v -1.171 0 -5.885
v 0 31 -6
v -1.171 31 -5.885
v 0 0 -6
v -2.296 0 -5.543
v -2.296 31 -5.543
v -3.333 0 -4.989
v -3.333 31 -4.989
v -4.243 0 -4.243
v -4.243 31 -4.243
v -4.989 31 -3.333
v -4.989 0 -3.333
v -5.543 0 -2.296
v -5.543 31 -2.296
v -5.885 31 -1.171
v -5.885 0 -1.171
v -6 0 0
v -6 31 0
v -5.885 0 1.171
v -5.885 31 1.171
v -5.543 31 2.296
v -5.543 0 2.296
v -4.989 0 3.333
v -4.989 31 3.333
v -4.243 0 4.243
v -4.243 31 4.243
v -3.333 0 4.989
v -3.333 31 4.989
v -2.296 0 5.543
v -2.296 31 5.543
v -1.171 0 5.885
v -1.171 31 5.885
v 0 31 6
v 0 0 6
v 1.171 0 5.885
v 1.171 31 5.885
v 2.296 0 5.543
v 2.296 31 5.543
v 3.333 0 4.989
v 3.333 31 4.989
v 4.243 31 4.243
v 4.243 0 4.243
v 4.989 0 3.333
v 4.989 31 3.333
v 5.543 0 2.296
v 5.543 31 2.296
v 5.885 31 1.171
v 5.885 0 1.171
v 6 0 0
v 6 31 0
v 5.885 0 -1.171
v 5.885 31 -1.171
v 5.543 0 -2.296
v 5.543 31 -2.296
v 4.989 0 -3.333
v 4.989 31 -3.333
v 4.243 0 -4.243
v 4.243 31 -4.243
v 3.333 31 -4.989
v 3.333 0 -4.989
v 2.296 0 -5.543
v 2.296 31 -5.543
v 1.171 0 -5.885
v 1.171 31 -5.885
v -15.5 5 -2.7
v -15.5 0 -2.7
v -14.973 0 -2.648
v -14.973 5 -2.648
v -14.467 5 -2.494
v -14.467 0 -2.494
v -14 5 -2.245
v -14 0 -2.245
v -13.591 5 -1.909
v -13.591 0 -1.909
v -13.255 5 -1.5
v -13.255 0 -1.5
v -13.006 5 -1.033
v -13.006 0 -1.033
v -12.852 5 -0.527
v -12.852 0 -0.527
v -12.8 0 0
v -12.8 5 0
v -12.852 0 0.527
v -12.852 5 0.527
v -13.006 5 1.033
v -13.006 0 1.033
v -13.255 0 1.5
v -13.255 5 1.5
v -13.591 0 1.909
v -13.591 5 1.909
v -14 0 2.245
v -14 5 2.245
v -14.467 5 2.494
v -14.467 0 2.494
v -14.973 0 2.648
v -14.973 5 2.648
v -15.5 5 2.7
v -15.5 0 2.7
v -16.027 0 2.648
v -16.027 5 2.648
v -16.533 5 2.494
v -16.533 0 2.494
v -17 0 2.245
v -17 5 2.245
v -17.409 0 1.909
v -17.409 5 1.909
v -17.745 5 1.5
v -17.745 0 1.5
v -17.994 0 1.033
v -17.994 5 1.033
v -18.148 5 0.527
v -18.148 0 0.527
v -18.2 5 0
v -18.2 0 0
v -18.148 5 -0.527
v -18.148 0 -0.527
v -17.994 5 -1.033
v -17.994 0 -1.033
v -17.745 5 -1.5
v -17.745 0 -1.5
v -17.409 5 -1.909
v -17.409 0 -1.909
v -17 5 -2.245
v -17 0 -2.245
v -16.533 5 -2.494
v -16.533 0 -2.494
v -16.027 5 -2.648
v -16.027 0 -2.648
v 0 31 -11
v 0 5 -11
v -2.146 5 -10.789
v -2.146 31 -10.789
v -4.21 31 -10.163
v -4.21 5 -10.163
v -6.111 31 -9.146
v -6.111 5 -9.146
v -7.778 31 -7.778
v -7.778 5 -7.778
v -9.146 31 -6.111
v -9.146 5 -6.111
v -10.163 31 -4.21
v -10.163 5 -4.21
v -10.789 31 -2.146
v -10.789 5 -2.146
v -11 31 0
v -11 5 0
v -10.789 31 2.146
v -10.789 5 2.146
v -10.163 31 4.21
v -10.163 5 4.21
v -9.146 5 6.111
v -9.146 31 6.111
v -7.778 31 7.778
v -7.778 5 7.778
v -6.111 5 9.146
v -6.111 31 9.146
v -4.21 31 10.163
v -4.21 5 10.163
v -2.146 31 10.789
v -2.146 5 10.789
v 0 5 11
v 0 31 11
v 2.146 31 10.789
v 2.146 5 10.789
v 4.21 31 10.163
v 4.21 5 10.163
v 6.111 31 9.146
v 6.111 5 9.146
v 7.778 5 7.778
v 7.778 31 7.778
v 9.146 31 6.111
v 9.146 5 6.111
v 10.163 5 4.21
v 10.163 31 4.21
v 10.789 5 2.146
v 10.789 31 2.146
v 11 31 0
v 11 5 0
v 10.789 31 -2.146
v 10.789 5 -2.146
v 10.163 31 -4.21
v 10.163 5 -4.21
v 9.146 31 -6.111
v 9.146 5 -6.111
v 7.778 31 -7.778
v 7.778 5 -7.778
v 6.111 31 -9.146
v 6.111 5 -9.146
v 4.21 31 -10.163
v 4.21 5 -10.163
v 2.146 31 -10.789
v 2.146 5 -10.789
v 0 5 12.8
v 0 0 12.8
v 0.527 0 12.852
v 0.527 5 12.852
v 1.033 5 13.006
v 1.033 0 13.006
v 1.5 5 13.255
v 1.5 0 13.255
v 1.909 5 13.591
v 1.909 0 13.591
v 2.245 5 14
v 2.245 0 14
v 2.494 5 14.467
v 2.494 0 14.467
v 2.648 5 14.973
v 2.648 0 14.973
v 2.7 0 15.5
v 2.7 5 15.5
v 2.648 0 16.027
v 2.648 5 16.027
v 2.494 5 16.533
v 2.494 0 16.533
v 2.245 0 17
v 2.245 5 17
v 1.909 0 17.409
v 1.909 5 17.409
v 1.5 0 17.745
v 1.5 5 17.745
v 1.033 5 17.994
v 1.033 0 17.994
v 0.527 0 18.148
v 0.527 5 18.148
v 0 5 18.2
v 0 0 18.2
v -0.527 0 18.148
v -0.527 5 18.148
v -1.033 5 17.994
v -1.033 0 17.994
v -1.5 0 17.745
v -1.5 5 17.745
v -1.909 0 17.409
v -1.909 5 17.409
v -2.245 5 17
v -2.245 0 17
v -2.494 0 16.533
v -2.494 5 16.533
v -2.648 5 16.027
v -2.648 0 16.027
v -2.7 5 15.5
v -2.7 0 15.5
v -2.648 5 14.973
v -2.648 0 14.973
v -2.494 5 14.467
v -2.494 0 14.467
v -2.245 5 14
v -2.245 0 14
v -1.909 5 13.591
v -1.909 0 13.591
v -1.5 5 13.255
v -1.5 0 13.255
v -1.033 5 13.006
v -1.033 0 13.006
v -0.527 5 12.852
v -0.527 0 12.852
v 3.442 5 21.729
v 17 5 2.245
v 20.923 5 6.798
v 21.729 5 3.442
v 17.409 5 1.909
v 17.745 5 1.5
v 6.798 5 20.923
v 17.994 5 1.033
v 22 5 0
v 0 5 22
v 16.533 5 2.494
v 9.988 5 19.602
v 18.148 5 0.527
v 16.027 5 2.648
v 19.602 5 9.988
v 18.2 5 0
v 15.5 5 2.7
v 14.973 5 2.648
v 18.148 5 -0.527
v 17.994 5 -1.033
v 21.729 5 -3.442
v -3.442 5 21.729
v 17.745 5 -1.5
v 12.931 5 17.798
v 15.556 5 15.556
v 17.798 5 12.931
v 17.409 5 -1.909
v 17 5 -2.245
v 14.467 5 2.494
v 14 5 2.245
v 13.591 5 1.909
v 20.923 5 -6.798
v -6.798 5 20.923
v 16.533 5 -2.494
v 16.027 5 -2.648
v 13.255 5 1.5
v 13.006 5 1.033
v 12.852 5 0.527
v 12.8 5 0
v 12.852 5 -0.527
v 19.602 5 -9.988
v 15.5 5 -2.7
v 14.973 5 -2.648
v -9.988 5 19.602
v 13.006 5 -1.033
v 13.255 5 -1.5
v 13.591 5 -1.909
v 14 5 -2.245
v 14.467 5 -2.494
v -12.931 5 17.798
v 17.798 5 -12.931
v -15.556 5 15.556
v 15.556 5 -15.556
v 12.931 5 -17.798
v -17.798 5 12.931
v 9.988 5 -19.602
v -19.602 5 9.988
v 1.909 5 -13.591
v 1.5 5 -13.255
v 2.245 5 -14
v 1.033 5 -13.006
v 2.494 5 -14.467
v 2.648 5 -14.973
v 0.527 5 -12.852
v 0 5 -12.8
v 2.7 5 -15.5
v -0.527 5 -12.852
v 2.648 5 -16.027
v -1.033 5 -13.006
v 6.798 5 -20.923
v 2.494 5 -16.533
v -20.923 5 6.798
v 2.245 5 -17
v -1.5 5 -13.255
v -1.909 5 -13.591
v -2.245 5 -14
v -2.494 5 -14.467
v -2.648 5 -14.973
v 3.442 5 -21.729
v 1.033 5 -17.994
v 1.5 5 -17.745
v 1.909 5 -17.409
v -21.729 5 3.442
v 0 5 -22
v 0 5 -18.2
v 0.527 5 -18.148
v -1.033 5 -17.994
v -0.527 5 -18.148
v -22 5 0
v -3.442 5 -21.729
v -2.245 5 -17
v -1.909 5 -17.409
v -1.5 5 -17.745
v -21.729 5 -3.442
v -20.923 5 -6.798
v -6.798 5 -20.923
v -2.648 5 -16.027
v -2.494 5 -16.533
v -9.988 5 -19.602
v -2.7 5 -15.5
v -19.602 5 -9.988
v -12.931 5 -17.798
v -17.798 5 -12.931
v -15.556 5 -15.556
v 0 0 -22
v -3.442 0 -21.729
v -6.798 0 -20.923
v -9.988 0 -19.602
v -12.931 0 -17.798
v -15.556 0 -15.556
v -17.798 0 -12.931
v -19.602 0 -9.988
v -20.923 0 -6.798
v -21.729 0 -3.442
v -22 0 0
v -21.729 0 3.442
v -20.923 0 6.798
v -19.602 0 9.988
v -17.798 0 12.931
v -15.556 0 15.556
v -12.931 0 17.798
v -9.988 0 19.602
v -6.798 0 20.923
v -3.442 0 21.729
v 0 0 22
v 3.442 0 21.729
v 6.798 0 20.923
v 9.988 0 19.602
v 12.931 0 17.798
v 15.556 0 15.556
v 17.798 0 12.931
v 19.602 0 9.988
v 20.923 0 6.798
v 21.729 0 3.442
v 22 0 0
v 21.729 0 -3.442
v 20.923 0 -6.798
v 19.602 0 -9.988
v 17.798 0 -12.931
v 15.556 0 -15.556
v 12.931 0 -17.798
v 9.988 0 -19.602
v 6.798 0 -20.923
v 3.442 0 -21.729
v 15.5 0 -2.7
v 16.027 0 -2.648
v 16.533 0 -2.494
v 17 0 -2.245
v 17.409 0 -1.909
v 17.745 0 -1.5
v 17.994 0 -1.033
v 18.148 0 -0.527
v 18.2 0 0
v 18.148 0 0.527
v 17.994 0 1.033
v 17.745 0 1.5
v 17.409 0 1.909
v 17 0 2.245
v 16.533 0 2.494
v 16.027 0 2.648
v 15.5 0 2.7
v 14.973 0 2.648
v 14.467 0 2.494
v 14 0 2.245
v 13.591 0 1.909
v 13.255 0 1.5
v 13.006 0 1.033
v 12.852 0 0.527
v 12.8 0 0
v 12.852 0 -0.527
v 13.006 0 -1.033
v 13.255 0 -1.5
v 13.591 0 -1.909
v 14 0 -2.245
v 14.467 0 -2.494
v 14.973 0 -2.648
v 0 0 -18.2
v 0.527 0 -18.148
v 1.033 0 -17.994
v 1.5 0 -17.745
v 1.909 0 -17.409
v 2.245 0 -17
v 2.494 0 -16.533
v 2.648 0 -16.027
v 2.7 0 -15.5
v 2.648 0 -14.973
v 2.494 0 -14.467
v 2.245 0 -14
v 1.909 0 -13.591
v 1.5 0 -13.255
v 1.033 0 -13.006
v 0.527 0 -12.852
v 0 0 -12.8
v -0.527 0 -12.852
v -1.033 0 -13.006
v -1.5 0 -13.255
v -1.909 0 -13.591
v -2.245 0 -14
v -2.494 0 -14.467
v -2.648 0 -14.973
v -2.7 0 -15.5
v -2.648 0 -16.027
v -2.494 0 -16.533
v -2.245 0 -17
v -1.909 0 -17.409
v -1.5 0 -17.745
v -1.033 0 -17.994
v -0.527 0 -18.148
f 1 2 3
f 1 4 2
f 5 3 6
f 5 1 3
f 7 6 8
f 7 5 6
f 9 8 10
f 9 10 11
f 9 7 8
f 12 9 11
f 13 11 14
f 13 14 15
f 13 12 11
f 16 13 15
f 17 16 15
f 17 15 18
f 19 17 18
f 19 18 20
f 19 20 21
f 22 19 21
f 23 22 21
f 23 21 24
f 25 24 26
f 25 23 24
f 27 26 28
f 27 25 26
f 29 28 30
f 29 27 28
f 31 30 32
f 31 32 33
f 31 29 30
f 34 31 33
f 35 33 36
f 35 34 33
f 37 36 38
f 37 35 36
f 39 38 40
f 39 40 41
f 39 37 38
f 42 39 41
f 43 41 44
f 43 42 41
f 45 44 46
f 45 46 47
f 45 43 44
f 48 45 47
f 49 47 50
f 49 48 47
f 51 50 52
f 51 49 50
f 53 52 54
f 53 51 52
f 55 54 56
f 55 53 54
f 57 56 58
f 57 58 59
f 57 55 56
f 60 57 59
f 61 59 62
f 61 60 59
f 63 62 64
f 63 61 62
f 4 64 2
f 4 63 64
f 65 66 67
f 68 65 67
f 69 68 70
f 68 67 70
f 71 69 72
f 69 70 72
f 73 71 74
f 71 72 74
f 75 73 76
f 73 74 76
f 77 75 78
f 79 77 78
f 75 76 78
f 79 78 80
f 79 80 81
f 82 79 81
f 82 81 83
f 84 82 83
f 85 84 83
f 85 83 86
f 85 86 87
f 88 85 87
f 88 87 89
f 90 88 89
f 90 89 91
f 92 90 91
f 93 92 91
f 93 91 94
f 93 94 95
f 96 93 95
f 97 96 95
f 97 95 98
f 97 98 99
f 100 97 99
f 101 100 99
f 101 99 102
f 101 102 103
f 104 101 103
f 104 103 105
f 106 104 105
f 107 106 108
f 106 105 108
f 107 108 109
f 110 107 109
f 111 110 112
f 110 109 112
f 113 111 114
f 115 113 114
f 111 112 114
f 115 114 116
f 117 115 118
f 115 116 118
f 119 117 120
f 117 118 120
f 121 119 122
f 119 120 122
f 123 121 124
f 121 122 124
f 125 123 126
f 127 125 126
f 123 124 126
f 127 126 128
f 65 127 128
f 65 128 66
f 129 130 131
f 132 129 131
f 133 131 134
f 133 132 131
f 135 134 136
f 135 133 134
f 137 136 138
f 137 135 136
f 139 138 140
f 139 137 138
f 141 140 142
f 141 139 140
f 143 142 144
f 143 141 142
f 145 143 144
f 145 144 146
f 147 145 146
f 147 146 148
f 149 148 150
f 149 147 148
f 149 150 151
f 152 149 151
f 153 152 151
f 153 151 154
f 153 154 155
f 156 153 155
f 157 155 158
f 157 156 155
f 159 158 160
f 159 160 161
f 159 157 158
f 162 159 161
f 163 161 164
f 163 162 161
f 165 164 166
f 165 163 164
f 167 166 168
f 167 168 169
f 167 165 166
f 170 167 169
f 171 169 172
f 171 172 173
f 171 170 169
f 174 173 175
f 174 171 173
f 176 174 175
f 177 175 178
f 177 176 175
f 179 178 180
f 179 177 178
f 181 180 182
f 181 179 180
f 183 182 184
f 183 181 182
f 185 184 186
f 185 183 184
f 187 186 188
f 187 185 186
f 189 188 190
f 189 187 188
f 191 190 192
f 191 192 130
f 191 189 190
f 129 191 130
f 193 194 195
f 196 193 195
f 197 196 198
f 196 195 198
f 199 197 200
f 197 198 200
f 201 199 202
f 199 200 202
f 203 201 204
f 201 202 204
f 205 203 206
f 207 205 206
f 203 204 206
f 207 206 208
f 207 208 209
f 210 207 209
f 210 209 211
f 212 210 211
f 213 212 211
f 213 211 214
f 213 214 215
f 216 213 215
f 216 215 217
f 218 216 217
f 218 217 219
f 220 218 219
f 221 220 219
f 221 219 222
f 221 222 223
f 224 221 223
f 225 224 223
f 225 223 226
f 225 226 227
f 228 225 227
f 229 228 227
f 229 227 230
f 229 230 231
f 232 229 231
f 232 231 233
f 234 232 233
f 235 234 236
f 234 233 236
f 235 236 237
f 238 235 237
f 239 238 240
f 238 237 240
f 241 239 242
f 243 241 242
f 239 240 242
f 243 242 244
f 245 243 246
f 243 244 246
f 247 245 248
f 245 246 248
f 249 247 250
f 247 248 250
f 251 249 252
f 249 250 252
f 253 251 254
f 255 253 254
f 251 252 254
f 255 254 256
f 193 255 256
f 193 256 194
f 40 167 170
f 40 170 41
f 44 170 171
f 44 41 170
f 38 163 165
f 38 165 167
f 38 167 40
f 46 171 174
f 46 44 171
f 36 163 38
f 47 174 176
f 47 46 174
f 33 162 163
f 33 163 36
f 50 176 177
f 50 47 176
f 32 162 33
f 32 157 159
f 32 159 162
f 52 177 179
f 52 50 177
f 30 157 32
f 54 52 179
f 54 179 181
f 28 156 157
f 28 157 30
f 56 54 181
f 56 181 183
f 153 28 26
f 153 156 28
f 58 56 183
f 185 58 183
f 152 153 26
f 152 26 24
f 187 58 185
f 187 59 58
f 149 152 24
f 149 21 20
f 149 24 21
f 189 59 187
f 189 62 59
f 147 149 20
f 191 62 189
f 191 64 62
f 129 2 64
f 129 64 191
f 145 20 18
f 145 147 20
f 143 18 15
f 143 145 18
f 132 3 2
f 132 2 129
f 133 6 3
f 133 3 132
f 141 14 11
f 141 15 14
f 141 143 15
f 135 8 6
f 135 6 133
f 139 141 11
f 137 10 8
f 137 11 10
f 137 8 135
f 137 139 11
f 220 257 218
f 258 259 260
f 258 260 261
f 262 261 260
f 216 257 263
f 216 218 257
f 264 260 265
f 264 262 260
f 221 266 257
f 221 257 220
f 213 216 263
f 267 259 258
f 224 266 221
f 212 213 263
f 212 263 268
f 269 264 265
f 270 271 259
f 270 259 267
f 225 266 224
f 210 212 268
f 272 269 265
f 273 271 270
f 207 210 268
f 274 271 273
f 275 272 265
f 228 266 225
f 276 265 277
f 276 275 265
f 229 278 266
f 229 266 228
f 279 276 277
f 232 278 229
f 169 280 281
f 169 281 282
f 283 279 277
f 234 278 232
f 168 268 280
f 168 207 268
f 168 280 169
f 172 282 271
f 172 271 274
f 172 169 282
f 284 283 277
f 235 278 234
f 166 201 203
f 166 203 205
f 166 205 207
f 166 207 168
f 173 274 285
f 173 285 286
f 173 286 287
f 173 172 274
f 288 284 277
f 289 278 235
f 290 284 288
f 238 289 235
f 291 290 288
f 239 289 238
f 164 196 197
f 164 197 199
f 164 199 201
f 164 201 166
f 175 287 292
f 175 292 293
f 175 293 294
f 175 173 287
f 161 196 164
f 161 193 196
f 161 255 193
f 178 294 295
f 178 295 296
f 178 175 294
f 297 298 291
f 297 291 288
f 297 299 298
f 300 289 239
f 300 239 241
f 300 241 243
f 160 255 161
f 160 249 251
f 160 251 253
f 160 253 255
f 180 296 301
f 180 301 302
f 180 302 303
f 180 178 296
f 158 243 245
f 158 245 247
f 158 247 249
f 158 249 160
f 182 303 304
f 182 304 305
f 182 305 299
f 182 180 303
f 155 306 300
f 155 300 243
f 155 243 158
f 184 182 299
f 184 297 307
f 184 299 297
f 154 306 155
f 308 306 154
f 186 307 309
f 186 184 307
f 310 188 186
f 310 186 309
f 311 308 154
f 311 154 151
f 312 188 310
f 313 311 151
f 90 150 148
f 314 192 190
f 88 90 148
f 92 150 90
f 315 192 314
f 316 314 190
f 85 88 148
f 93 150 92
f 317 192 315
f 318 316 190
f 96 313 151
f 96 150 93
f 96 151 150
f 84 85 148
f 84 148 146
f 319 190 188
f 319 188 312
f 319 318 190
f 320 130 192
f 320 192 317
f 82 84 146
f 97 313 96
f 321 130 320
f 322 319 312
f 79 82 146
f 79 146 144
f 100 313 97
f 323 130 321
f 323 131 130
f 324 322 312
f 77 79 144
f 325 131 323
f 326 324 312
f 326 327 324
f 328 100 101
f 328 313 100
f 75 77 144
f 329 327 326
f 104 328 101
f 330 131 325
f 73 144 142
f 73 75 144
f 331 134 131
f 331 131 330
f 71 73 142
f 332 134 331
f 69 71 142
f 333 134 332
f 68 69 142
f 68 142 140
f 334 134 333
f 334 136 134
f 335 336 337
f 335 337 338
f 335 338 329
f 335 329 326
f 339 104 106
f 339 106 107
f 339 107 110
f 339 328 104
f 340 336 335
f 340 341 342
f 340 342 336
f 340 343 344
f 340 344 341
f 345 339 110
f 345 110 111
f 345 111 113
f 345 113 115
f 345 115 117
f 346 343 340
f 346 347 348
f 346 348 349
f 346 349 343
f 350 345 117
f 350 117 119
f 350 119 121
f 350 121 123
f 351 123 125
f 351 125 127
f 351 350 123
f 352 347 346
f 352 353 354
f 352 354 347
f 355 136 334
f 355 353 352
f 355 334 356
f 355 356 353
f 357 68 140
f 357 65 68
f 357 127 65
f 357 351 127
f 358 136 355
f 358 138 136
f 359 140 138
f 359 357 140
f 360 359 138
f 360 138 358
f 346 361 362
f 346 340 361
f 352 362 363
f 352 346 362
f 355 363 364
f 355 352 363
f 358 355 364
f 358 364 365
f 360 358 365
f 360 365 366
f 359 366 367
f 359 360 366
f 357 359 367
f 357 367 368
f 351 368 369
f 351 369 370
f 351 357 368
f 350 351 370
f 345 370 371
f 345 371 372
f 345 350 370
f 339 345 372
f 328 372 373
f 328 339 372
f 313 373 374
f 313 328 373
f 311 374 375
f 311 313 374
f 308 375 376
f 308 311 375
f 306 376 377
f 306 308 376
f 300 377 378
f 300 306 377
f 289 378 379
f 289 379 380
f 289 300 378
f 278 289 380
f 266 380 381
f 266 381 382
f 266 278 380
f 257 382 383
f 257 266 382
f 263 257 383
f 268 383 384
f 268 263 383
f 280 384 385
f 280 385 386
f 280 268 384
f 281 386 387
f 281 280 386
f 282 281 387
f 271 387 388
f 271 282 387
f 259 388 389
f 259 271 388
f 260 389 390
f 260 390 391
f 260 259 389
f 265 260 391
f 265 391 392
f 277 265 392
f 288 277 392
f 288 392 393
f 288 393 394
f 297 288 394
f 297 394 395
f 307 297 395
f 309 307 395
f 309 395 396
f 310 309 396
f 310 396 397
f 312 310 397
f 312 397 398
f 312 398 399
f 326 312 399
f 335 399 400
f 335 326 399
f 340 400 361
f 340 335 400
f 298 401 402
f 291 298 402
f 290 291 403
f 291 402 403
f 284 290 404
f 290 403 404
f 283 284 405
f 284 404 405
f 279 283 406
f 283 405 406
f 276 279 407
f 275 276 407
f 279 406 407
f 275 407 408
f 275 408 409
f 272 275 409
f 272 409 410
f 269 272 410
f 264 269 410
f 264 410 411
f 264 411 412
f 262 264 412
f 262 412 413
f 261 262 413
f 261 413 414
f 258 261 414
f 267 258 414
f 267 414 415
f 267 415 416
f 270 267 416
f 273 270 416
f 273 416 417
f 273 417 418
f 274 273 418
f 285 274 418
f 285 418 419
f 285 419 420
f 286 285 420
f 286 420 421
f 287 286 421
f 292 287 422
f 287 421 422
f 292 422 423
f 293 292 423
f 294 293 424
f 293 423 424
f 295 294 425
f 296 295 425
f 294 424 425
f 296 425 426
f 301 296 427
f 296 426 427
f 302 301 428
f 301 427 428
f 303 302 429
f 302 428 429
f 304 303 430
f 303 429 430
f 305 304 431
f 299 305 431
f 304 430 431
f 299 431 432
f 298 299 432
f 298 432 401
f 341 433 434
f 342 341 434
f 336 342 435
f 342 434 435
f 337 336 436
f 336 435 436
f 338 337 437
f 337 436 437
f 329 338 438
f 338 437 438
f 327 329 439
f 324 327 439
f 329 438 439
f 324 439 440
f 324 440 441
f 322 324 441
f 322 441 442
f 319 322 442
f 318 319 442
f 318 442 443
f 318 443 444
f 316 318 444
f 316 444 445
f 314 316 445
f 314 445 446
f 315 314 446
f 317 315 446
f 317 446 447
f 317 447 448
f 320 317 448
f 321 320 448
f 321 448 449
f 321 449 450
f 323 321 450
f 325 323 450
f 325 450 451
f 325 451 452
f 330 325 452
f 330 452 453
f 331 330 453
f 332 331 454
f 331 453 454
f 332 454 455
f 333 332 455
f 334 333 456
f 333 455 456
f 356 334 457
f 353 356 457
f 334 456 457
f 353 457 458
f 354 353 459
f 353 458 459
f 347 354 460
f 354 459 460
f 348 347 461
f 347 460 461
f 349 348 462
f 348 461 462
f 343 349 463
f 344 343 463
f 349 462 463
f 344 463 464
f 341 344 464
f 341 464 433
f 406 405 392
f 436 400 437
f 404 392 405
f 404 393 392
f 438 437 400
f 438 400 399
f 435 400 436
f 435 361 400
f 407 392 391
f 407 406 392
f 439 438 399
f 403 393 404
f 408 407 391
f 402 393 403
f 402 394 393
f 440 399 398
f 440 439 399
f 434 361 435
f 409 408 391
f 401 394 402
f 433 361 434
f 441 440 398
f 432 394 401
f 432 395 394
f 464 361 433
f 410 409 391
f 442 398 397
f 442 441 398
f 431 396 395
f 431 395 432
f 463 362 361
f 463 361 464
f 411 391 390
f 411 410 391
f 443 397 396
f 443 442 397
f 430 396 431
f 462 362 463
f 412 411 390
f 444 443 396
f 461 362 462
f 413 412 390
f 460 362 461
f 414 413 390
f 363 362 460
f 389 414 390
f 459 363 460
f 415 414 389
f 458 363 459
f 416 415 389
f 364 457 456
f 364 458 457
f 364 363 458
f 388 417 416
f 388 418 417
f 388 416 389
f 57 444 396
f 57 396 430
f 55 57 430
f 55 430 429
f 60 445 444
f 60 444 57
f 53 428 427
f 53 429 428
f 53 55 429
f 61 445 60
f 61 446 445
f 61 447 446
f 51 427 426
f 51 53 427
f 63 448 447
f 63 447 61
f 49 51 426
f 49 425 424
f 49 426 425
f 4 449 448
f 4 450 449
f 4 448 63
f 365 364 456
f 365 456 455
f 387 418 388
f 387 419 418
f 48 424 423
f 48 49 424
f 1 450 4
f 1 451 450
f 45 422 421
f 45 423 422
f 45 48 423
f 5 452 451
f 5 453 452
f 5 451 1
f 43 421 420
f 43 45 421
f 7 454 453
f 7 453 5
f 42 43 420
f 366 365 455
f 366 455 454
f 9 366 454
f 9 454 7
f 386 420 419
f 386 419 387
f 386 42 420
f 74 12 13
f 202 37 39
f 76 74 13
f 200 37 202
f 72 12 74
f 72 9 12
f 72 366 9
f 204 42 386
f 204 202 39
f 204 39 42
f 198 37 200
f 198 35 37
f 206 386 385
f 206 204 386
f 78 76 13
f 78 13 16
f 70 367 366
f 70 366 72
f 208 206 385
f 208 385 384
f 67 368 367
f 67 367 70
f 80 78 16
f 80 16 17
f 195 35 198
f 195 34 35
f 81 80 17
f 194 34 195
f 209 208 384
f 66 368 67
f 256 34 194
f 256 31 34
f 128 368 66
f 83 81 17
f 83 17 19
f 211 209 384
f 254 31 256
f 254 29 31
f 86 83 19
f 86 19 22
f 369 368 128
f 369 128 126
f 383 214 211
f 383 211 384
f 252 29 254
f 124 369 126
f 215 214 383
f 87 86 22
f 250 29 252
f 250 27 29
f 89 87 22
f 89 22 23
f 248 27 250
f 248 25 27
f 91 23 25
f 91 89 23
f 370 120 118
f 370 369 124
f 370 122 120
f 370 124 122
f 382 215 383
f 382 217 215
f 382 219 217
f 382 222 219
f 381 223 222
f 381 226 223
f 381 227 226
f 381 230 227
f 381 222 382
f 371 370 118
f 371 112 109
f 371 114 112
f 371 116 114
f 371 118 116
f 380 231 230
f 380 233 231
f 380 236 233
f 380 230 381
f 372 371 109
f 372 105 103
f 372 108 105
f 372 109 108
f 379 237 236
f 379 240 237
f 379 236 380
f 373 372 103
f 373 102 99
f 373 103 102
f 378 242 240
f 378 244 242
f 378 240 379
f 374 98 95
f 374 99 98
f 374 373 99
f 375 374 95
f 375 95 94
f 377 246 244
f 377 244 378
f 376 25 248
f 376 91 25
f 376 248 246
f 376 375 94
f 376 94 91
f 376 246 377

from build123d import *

# Parameters (mm, degrees)
SKETCH2_R          = 2.7
CUT_EXTRUDE1_DEPTH = 10


with BuildPart() as part:
    # Sketch1 → Revolve1 (revolve)
    with BuildSketch(Plane.XY, mode=Mode.PRIVATE) as revolve1_sk:
        Polygon((6, 0), (22, 0), (22, 5), (11, 5), (11, 31), (6, 31), align=None)
    revolve(revolve1_sk.sketch.rotate(Axis((0, 0, 0), (0, 1, 0)), 90), axis=Axis((0, 0, 0), (0, 1, 0)))  # turned: the seam where the file's is

    # Sketch2 → Cut-Extrude1 (cut)
    with BuildSketch(Plane.XZ):
        with Locations(Location((0, 15.5, 0), (0, 0, 270))):  # turned: the seam where the file's is
            Circle(SKETCH2_R)
        with Locations(Location((15.5, 0, 0), (0, 0, 270))):  # turned: the seam where the file's is
            Circle(SKETCH2_R)
        with Locations(Location((0, -15.5, 0), (0, 0, 270))):  # turned: the seam where the file's is
            Circle(SKETCH2_R)
        with Locations(Location((-15.5, 0, 0), (0, 0, 270))):  # turned: the seam where the file's is
            Circle(SKETCH2_R)
    extrude(amount=-CUT_EXTRUDE1_DEPTH, mode=Mode.SUBTRACT)


solid = part.part
